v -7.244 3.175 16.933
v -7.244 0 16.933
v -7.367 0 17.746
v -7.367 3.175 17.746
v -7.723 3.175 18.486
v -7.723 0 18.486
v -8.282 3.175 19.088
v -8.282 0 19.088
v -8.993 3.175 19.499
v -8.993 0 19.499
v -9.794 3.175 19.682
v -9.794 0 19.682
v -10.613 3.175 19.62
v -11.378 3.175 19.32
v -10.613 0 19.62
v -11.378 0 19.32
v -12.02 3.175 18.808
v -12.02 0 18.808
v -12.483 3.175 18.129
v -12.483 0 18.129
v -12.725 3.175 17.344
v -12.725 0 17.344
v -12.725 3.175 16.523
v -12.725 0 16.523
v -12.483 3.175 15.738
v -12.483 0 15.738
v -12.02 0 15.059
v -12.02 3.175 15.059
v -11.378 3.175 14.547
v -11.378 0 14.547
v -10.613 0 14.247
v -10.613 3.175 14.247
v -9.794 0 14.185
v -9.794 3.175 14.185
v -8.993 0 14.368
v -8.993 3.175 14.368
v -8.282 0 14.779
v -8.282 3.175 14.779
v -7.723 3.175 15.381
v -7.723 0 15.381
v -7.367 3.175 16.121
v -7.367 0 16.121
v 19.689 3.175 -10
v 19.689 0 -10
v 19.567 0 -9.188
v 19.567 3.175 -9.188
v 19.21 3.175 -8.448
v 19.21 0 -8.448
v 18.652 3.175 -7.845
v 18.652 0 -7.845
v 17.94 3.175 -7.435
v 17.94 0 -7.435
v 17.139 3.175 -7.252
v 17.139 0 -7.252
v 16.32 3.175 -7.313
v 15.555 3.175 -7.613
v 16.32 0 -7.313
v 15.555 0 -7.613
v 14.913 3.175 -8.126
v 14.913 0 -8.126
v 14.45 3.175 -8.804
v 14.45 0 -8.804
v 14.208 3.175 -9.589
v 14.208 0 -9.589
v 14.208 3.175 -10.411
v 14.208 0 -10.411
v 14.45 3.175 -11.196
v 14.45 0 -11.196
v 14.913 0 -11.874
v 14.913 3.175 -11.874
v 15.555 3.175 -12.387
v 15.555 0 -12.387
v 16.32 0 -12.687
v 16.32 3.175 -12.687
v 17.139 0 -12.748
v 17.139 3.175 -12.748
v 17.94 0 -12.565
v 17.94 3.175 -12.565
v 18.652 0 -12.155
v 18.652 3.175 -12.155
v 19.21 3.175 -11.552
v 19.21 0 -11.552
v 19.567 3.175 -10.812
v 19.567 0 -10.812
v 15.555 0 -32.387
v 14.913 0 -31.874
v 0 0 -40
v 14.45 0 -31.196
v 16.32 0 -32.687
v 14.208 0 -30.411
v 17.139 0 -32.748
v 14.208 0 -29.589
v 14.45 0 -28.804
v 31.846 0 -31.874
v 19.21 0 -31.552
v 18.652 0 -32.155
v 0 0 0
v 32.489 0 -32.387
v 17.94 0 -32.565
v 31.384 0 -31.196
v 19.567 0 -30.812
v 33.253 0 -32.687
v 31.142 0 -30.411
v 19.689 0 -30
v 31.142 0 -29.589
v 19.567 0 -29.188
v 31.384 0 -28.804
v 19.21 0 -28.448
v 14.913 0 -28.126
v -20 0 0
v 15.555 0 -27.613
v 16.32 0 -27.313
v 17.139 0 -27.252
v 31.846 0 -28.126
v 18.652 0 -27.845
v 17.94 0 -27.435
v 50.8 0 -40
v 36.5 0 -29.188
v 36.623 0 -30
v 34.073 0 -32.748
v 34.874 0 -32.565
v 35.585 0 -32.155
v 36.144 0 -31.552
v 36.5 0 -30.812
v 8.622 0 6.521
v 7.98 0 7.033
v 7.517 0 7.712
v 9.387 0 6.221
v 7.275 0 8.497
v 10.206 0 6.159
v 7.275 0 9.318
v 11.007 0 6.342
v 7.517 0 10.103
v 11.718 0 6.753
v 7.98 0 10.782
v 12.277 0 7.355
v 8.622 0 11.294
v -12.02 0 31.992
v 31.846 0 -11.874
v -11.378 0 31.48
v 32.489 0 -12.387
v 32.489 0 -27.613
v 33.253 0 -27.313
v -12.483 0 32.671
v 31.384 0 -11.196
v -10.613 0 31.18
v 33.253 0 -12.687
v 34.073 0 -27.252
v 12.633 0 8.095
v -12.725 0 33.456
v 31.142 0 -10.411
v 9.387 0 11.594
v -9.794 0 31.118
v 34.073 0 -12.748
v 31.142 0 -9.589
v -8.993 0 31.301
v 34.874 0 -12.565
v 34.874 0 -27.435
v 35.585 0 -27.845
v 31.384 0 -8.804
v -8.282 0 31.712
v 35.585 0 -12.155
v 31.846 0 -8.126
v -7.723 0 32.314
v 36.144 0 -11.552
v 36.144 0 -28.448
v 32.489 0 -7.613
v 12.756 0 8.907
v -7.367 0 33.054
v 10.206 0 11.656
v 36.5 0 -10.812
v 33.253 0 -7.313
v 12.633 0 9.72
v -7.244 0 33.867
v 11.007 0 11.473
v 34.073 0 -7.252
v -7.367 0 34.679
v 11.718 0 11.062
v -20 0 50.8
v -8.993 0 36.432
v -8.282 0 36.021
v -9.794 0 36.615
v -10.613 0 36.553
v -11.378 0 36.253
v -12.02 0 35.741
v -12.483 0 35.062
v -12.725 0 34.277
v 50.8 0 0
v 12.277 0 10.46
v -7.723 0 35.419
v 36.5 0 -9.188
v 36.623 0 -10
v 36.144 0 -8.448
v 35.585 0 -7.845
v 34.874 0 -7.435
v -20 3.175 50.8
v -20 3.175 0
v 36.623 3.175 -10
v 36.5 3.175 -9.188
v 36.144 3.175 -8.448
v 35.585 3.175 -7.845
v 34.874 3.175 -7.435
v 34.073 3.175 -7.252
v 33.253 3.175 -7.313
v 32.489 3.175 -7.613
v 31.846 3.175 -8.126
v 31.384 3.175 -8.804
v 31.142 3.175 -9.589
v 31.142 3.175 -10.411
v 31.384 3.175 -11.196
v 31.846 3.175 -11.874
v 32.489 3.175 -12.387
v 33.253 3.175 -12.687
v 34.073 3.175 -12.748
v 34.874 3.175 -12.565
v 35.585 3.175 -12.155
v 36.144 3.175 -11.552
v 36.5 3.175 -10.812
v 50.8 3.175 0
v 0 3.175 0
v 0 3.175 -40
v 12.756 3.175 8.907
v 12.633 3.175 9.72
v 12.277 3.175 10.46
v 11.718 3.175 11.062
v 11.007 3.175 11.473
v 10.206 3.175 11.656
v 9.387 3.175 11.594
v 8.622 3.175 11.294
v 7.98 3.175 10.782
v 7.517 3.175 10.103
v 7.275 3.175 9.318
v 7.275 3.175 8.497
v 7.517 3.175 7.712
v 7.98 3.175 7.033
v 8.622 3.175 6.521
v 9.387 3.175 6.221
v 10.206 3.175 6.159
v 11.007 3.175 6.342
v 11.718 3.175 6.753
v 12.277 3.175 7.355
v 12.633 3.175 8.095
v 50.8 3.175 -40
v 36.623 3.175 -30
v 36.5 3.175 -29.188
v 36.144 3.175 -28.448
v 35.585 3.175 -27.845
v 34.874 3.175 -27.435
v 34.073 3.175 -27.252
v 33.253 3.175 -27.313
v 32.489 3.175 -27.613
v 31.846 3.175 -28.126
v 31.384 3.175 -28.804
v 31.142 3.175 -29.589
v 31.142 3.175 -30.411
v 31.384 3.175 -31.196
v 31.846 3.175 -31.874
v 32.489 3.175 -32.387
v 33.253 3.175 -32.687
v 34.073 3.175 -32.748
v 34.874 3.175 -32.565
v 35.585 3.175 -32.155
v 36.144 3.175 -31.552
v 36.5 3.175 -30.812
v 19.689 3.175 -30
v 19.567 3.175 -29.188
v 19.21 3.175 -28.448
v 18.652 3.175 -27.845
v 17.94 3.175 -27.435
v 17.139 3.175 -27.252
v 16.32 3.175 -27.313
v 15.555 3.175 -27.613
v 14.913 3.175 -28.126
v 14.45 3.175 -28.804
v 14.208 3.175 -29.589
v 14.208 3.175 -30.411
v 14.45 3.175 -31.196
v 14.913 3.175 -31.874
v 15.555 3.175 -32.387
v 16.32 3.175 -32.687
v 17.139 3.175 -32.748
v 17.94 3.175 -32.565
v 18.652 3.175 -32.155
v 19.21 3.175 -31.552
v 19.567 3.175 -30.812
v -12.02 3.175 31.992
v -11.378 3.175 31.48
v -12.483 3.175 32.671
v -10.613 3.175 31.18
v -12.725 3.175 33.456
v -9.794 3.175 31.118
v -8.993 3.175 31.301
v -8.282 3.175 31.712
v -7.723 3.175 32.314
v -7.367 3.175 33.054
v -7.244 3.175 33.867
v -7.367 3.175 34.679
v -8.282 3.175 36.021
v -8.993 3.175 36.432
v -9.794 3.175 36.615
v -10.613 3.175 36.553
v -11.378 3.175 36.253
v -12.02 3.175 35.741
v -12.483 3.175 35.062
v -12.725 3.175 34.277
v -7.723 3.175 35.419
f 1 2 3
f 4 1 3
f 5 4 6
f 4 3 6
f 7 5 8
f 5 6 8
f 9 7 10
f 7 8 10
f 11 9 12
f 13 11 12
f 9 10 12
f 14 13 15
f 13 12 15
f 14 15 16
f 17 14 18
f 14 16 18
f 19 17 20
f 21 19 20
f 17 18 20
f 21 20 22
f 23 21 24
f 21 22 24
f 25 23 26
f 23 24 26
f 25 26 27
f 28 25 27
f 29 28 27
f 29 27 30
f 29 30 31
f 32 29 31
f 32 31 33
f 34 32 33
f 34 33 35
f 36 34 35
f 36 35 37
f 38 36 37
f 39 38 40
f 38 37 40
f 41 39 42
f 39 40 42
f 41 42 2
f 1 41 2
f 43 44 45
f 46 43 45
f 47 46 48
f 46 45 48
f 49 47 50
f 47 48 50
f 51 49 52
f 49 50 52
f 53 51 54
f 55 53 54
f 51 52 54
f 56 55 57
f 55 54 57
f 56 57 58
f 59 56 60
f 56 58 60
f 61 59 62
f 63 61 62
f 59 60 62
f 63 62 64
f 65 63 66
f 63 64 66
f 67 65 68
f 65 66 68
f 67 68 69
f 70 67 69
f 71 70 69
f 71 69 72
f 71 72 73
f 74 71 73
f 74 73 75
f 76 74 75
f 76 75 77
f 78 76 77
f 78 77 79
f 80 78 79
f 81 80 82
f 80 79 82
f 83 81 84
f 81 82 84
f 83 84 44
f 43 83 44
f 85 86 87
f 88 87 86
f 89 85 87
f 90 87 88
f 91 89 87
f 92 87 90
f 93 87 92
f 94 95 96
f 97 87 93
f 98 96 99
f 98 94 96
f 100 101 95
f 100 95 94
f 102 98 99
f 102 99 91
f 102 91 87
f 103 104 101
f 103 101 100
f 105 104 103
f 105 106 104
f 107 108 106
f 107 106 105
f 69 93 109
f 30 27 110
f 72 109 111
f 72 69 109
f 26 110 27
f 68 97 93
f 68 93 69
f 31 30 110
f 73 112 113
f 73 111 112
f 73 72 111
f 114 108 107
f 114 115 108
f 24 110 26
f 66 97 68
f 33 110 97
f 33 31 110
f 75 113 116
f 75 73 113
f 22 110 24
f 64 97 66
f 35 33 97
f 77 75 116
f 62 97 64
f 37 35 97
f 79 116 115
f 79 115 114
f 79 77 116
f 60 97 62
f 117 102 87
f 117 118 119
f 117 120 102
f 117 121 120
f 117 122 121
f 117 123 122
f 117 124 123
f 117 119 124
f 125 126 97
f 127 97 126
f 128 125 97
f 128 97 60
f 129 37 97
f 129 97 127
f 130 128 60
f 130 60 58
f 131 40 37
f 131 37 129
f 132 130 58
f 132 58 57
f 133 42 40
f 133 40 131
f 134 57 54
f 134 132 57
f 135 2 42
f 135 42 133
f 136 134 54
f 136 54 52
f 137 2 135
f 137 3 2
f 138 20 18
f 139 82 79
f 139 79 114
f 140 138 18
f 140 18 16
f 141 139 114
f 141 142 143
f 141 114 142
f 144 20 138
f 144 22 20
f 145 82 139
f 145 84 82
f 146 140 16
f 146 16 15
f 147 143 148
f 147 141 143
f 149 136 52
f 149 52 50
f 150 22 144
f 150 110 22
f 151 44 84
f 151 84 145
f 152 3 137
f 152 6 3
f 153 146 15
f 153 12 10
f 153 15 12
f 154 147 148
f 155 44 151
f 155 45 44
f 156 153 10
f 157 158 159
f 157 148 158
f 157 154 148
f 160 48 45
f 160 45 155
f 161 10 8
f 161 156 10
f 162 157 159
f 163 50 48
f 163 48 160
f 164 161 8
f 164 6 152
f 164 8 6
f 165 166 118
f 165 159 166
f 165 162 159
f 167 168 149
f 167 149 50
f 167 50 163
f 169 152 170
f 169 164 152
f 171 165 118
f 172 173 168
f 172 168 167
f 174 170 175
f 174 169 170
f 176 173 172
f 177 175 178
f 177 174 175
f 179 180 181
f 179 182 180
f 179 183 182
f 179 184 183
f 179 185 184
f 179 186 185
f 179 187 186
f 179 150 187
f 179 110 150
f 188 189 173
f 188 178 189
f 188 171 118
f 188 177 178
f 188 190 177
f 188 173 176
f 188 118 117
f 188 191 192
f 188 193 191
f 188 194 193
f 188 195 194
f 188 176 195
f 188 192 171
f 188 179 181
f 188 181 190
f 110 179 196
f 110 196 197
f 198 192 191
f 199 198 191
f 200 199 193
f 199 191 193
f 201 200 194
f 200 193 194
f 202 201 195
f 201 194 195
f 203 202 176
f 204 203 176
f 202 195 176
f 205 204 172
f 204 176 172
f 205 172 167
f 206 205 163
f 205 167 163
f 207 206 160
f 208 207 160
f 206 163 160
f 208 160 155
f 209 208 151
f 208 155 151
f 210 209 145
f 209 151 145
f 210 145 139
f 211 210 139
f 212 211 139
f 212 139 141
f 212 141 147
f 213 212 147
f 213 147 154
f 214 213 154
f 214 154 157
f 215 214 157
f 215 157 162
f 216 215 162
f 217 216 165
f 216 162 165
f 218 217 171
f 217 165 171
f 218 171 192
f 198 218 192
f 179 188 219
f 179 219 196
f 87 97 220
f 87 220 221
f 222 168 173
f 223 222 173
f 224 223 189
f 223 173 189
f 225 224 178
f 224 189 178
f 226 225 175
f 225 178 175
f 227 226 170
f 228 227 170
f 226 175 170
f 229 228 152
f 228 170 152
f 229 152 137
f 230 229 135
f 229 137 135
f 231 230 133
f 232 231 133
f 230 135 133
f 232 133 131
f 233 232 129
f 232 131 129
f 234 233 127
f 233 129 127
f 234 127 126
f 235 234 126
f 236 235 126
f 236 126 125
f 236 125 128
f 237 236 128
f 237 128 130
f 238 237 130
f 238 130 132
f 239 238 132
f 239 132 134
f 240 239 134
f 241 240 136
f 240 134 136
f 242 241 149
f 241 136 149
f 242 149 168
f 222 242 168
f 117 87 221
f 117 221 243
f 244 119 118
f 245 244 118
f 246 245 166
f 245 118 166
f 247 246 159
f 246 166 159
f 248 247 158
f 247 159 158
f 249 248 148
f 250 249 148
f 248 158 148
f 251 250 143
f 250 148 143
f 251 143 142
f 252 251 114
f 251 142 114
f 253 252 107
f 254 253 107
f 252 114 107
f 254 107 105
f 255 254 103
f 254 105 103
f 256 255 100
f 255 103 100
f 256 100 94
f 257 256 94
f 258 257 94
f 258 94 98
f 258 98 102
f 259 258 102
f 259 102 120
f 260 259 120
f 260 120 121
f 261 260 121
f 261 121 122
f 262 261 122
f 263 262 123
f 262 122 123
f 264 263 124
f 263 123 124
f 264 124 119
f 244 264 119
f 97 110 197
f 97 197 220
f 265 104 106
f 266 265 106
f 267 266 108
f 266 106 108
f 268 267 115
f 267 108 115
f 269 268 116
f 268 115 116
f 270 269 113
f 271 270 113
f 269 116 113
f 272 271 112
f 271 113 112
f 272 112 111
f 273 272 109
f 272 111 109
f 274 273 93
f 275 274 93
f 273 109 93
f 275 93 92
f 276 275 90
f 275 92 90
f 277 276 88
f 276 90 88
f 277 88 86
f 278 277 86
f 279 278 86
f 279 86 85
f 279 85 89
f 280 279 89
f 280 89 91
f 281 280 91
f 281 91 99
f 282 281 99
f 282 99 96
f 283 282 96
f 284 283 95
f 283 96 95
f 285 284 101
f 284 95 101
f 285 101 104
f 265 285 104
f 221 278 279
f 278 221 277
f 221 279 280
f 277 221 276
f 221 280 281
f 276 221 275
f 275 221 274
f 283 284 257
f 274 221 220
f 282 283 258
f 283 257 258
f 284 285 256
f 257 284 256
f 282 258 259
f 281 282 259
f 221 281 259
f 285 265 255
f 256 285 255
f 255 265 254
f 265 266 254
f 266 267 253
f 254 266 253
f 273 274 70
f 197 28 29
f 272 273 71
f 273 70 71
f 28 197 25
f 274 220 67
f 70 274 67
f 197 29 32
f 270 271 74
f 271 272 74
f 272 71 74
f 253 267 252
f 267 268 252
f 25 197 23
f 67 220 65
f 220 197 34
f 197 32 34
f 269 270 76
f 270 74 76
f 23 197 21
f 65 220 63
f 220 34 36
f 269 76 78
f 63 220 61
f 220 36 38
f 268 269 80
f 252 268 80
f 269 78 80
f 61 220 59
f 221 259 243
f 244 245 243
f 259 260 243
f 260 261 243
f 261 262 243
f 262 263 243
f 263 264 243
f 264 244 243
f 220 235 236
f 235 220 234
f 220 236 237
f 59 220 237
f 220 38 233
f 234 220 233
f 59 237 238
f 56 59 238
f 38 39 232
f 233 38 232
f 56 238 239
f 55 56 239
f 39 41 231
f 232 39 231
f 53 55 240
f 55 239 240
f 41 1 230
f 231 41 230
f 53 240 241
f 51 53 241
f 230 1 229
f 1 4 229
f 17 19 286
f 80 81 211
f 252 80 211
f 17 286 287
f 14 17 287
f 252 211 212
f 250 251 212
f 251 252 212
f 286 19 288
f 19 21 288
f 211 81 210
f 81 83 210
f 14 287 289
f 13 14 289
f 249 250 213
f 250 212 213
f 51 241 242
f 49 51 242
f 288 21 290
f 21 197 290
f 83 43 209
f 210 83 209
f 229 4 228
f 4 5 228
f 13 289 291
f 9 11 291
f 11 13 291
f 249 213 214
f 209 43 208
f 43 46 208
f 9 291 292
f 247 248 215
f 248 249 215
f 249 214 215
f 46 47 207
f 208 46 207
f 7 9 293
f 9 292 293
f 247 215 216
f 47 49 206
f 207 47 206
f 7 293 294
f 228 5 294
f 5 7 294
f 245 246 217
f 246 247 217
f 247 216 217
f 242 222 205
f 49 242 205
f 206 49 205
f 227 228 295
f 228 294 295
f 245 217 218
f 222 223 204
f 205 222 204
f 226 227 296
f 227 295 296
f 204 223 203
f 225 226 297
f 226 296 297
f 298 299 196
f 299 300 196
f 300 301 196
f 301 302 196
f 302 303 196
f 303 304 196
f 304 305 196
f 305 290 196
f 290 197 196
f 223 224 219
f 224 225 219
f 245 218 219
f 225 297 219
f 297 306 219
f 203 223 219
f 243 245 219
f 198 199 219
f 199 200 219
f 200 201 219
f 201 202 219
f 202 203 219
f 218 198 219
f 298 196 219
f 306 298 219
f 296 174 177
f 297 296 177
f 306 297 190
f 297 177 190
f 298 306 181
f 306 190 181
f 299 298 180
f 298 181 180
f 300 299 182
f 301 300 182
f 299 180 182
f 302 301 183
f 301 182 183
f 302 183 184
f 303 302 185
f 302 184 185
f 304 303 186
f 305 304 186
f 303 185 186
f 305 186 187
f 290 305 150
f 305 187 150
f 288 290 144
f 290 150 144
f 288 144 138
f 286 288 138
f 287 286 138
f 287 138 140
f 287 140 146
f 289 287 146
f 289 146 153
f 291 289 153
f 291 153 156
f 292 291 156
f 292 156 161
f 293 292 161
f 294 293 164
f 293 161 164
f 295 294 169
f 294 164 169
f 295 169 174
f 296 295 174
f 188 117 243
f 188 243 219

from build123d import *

# Parameters (mm, degrees)
F0_R     = 2.7559
F1_DEPTH = 3.175


with BuildPart() as f1:
    # F0 (on Front) → F1 (new body)
    with BuildSketch(Plane.XZ):
        Polygon((1.1e-05, -14.514416), (1.1e-05, -40), (50.800011, -40), (50.800011, 0), (-20, 50.8), (-20, 0), (1.1e-05, 0), align=None)
        with Locations((16.933344, -29.999995)):
            Circle(F0_R, mode=Mode.SUBTRACT)
        with Locations((33.866677, -29.999995)):
            Circle(F0_R, mode=Mode.SUBTRACT)
        with Locations((16.933344, -10.000005)):
            Circle(F0_R, mode=Mode.SUBTRACT)
        with Locations((33.866677, -10.000005)):
            Circle(F0_R, mode=Mode.SUBTRACT)
        with Locations((-9.999995, 16.933333)):
            Circle(F0_R, mode=Mode.SUBTRACT)
        with Locations((10.000016, 8.907365)):
            Circle(F0_R, mode=Mode.SUBTRACT)
        with Locations((-9.999995, 33.866667)):
            Circle(F0_R, mode=Mode.SUBTRACT)
    extrude(amount=-F1_DEPTH)


solid = f1.part
